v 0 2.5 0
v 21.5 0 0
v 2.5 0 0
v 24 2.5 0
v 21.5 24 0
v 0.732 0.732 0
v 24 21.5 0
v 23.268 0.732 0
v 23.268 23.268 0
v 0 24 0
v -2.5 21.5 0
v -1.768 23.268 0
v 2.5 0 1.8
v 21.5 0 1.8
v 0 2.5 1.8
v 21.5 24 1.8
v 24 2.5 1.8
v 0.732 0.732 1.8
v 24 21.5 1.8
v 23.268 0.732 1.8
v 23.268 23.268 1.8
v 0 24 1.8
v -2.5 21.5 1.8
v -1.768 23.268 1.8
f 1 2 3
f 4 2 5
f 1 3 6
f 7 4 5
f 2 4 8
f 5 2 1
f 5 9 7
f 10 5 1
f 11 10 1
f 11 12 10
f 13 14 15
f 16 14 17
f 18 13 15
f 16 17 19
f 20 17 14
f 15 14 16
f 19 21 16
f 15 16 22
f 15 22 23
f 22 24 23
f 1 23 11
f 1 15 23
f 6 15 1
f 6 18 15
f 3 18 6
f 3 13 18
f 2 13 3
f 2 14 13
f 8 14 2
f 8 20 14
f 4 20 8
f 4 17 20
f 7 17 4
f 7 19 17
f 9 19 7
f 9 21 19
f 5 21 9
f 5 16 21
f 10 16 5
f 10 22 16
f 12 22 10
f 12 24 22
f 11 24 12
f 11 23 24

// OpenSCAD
// file: roundedsquare.scad
module roundedSquare(size=[10,10], radius=1, center=false) {
    translate(center ? -size/2 : [0,0])
    hull() {
        translate([radius,radius]) circle(r=radius);
        translate([size[0]-radius,radius]) circle(r=radius);
        translate([size[0]-radius,size[0]-radius]) circle(r=radius);
        translate([0,size[0]-radius]) circle(r=radius);
    }
}
// main file
use <roundedsquare.scad>;

l = 25-1;
w = 57-1;
d = 1.8;

linear_extrude(height=d) 
    roundedSquare([l,w],radius=2.5);
    
